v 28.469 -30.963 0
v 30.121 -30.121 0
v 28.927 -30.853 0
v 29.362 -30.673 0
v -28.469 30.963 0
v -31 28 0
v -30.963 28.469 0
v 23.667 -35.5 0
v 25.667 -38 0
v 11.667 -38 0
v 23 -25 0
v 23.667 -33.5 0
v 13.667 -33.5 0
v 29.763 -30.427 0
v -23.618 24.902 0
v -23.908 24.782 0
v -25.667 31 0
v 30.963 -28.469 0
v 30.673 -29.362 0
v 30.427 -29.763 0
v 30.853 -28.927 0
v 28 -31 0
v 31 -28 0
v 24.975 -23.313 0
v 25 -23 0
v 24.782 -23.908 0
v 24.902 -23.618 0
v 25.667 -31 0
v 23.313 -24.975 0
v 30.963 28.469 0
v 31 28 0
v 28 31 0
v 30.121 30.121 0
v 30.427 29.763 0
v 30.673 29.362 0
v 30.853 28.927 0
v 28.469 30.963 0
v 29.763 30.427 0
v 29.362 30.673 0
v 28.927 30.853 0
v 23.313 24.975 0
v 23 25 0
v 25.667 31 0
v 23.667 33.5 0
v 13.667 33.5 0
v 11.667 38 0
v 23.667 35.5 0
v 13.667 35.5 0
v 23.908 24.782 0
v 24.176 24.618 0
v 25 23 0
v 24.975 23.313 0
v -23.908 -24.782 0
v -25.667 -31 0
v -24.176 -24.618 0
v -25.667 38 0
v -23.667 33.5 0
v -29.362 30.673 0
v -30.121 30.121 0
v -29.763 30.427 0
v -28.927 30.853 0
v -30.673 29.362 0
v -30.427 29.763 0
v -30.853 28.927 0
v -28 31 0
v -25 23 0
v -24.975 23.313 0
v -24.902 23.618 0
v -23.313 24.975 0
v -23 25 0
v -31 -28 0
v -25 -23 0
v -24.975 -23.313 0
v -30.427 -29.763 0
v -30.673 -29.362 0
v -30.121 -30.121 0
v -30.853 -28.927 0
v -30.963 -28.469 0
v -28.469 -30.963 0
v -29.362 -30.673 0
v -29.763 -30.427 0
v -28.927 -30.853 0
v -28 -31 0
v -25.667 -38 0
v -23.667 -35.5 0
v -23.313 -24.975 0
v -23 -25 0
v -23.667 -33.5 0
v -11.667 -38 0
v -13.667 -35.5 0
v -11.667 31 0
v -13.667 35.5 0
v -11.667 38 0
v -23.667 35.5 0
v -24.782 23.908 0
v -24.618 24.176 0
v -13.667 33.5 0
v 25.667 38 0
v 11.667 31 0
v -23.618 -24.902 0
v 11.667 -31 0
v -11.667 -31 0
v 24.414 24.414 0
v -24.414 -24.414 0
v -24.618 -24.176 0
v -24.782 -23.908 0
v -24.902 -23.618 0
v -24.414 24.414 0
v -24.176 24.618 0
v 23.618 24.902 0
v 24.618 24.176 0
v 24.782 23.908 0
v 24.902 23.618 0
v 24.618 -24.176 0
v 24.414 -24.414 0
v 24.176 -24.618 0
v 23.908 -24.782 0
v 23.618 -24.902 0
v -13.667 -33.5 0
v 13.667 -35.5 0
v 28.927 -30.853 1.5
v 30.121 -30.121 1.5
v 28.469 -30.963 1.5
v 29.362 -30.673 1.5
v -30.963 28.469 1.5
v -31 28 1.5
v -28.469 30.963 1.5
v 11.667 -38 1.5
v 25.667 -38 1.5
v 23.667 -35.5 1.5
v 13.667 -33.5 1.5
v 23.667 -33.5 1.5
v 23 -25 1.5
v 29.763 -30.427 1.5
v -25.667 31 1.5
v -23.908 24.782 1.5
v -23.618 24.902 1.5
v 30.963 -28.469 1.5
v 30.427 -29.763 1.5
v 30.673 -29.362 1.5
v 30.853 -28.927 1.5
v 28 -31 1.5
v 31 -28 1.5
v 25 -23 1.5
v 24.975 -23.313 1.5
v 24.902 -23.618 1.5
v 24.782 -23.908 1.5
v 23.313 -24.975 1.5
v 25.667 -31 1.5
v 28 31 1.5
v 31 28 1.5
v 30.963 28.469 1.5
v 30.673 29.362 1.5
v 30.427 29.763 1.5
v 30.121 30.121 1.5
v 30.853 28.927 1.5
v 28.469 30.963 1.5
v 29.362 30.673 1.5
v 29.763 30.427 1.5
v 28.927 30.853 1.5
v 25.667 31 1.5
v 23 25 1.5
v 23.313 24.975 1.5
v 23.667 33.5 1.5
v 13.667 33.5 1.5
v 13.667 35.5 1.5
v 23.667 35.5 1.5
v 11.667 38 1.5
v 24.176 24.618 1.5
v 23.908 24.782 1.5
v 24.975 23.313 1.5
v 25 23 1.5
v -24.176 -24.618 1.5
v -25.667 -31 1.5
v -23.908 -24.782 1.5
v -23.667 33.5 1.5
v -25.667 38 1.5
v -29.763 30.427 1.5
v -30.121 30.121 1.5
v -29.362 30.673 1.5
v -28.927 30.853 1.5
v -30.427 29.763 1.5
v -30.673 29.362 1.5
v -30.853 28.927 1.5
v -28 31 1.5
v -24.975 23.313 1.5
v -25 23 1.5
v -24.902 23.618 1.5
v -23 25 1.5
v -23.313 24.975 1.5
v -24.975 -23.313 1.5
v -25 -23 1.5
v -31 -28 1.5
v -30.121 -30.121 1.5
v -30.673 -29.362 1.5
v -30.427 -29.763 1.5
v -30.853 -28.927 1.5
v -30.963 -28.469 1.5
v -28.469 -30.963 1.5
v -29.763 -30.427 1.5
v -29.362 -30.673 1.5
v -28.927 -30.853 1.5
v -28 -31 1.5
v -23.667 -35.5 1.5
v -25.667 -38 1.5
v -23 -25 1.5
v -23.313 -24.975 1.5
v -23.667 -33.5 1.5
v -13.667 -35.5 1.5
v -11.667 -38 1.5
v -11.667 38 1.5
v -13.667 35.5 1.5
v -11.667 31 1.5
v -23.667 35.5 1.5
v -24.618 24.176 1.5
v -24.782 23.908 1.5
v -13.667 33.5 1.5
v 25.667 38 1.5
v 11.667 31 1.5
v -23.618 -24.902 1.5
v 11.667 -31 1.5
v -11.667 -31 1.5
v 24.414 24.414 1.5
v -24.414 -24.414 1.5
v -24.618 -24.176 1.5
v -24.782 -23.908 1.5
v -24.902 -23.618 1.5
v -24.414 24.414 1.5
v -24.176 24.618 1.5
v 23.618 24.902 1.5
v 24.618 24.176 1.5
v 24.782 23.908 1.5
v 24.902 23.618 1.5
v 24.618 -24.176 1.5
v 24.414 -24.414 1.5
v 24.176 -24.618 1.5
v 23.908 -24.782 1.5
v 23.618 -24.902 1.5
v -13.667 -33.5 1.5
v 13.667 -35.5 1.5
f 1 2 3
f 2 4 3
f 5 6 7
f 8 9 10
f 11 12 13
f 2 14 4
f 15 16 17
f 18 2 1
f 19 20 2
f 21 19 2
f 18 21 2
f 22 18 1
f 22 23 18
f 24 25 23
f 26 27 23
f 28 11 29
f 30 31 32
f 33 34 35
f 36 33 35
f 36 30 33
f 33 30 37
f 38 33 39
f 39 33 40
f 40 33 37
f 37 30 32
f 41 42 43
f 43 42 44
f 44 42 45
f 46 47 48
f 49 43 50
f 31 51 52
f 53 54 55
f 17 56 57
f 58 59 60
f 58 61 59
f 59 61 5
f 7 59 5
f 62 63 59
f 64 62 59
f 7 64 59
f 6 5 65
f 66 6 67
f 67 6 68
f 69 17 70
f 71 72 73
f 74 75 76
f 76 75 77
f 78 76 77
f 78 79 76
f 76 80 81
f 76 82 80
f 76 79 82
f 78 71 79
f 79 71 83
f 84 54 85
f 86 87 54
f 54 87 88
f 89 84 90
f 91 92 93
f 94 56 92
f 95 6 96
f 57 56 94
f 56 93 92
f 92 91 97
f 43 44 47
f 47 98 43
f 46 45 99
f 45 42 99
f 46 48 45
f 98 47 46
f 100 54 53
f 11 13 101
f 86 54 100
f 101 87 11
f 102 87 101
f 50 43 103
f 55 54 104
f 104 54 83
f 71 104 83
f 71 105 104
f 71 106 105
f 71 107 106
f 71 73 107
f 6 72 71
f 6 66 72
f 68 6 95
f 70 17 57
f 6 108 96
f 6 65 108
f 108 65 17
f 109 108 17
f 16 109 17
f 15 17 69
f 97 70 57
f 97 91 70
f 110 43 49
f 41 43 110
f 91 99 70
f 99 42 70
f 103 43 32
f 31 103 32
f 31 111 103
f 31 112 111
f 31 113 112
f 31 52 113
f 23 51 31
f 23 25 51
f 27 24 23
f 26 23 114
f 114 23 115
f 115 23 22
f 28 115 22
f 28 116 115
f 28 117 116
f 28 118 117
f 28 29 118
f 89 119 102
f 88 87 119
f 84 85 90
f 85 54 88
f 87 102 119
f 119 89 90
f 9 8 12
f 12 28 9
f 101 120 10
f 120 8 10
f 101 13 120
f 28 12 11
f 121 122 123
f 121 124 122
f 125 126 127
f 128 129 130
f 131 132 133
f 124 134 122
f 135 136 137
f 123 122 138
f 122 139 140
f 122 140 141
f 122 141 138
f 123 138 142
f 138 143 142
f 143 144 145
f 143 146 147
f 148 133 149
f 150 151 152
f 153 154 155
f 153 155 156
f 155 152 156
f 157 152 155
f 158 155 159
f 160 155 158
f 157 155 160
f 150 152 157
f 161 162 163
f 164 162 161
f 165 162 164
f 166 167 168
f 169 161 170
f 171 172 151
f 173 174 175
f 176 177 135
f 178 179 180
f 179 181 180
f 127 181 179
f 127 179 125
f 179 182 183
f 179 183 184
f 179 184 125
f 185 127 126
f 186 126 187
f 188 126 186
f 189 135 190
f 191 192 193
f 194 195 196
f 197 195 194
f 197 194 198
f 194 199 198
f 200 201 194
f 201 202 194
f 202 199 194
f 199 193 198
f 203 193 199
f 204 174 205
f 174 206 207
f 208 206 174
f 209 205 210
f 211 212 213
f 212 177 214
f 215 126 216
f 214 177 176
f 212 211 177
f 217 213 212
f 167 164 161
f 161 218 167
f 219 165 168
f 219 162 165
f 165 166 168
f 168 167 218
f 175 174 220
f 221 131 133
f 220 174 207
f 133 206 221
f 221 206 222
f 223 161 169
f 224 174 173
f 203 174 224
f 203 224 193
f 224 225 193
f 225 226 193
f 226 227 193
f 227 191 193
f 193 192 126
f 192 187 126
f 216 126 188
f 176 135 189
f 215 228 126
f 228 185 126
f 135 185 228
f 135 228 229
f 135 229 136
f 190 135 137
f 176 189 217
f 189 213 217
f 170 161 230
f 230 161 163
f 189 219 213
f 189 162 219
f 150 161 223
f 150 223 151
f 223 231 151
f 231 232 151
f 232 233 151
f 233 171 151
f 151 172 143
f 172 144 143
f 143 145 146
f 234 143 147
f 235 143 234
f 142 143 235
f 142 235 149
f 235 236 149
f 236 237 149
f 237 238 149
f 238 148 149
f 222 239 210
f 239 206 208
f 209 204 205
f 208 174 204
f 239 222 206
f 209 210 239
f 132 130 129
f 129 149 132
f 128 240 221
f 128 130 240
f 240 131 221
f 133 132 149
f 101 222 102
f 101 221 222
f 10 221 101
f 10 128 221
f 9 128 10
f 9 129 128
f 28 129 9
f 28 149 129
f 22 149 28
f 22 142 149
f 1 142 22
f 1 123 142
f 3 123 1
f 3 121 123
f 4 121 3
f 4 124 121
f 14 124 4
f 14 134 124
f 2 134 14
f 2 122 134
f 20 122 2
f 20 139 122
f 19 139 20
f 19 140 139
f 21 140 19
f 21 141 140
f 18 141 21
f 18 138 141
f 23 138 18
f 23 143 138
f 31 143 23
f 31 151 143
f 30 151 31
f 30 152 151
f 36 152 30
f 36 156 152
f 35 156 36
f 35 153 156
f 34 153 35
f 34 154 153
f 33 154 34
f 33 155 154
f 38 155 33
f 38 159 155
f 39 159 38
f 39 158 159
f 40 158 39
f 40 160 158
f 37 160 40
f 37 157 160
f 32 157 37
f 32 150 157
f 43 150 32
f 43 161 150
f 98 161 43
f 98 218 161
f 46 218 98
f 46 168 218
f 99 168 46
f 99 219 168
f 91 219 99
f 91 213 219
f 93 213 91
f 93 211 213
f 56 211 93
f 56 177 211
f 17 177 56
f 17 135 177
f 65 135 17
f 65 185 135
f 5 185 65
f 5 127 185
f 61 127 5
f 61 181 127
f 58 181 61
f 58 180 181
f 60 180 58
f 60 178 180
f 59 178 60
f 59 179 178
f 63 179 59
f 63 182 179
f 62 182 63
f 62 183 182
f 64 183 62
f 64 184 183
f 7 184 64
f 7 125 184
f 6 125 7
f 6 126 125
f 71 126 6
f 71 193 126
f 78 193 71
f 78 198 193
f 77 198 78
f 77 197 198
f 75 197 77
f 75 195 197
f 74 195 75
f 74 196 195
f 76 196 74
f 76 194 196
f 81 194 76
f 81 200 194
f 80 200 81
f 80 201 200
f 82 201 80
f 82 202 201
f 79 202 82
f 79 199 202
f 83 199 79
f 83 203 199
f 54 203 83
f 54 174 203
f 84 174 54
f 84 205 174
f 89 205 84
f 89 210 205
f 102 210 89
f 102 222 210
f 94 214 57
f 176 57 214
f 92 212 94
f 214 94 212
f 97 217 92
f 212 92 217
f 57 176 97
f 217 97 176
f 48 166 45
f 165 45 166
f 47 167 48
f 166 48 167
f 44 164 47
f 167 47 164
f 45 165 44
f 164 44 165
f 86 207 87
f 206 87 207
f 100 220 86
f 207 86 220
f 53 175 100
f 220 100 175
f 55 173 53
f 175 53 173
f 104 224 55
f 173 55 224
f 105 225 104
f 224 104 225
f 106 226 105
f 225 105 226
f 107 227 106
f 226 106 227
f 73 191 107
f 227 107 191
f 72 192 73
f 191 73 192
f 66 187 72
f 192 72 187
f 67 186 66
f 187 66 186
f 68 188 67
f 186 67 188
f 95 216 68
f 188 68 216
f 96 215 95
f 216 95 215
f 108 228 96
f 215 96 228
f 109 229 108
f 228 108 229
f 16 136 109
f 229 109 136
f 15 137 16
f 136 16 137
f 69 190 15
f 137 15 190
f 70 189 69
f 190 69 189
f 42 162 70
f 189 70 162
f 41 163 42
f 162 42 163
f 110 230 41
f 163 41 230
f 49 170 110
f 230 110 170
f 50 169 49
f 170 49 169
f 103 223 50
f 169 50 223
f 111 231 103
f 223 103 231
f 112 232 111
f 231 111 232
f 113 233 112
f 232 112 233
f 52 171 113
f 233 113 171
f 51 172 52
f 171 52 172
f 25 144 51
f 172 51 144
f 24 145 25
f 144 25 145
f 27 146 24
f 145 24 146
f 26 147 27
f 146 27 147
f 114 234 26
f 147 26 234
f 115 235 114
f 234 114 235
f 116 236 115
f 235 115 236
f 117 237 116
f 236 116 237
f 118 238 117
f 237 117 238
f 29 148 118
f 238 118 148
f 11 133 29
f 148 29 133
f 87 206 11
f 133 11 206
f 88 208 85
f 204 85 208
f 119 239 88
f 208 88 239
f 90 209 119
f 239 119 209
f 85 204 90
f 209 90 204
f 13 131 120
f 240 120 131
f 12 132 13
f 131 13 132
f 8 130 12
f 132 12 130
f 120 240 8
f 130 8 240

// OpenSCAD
// ROBOSKIN original removable bench fixture. Units: mm.
// This geometry has not been printed, structurally qualified, or fitted to a robot.
// Example: openscad -D 'part="carrier"' -D columns=3 -D rows=2 -o carrier.stl removable_carrier.scad
part="carrier"; // "carrier", "strain_relief", or "both"
columns=2;
rows=2;
pitch=25;
seal_margin=3;
rim=3;
thickness=1.5;
strap_width=10;
strap_slot=2;
ear_extension=7;
tail_slot_width=0; // Set to measured tail width + assembly clearance before live-panel use.
length=columns*pitch+2*seal_margin;
width=rows*pitch+2*seal_margin;
$fn=40;

assert(columns==2 && rows==2 || columns==3 && rows==2 || columns==7 && rows==4,
       "Use an explicitly supported channel profile");
assert(part=="carrier" || part=="strain_relief" || part=="both", "Unknown part");
assert(pitch>0 && seal_margin>0 && rim>0 && thickness>0 && strap_width>0 && strap_slot>0);
assert(tail_slot_width>=0 && tail_slot_width<width-2*seal_margin, "Invalid sensor-tail opening");

module rounded_rectangle(l,w,r=3) {
    hull() for(x=[-l/2+r,l/2-r]) for(y=[-w/2+r,w/2-r]) translate([x,y]) circle(r=r);
}
module carrier() {
    linear_extrude(thickness) difference() {
        union() {
            rounded_rectangle(length+2*rim,width+2*rim);
            // Two independent lateral straps; do not preload the sensing field.
            for(x=[-length/3,length/3]) for(s=[-1,1])
                translate([x,s*(width/2+rim+ear_extension/2-.5)]) square([strap_width+4,ear_extension+1],center=true);
        }
        rounded_rectangle(length-2*seal_margin,width-2*seal_margin,r=2);
        for(x=[-length/3,length/3]) for(s=[-1,1])
            translate([x,s*(width/2+rim+ear_extension/2)]) square([strap_width,strap_slot],center=true);
        // Optional opening in the +x rim. Its dimensions follow the actual sensor tail.
        // Keep the tail clear of the straps and avoid clamping its copper/printed traces.
        if(tail_slot_width>0)
            translate([length/2,0]) square([2*(rim+seal_margin+1),tail_slot_width],center=true);
    }
}
module cable_strain_relief() {
    // Tie a soft sleeve, not bare insulation. Mount on the same rigid body as the controller.
    difference() {
        linear_extrude(2) rounded_rectangle(30,16,r=3);
        for(x=[-9,9]) translate([x,0,-.1]) linear_extrude(2.2) square([2,10],center=true);
    }
}
if(part=="carrier" || part=="both") carrier();
if(part=="strain_relief") cable_strain_relief();
if(part=="both") translate([length/2+25,0,0]) cable_strain_relief();
